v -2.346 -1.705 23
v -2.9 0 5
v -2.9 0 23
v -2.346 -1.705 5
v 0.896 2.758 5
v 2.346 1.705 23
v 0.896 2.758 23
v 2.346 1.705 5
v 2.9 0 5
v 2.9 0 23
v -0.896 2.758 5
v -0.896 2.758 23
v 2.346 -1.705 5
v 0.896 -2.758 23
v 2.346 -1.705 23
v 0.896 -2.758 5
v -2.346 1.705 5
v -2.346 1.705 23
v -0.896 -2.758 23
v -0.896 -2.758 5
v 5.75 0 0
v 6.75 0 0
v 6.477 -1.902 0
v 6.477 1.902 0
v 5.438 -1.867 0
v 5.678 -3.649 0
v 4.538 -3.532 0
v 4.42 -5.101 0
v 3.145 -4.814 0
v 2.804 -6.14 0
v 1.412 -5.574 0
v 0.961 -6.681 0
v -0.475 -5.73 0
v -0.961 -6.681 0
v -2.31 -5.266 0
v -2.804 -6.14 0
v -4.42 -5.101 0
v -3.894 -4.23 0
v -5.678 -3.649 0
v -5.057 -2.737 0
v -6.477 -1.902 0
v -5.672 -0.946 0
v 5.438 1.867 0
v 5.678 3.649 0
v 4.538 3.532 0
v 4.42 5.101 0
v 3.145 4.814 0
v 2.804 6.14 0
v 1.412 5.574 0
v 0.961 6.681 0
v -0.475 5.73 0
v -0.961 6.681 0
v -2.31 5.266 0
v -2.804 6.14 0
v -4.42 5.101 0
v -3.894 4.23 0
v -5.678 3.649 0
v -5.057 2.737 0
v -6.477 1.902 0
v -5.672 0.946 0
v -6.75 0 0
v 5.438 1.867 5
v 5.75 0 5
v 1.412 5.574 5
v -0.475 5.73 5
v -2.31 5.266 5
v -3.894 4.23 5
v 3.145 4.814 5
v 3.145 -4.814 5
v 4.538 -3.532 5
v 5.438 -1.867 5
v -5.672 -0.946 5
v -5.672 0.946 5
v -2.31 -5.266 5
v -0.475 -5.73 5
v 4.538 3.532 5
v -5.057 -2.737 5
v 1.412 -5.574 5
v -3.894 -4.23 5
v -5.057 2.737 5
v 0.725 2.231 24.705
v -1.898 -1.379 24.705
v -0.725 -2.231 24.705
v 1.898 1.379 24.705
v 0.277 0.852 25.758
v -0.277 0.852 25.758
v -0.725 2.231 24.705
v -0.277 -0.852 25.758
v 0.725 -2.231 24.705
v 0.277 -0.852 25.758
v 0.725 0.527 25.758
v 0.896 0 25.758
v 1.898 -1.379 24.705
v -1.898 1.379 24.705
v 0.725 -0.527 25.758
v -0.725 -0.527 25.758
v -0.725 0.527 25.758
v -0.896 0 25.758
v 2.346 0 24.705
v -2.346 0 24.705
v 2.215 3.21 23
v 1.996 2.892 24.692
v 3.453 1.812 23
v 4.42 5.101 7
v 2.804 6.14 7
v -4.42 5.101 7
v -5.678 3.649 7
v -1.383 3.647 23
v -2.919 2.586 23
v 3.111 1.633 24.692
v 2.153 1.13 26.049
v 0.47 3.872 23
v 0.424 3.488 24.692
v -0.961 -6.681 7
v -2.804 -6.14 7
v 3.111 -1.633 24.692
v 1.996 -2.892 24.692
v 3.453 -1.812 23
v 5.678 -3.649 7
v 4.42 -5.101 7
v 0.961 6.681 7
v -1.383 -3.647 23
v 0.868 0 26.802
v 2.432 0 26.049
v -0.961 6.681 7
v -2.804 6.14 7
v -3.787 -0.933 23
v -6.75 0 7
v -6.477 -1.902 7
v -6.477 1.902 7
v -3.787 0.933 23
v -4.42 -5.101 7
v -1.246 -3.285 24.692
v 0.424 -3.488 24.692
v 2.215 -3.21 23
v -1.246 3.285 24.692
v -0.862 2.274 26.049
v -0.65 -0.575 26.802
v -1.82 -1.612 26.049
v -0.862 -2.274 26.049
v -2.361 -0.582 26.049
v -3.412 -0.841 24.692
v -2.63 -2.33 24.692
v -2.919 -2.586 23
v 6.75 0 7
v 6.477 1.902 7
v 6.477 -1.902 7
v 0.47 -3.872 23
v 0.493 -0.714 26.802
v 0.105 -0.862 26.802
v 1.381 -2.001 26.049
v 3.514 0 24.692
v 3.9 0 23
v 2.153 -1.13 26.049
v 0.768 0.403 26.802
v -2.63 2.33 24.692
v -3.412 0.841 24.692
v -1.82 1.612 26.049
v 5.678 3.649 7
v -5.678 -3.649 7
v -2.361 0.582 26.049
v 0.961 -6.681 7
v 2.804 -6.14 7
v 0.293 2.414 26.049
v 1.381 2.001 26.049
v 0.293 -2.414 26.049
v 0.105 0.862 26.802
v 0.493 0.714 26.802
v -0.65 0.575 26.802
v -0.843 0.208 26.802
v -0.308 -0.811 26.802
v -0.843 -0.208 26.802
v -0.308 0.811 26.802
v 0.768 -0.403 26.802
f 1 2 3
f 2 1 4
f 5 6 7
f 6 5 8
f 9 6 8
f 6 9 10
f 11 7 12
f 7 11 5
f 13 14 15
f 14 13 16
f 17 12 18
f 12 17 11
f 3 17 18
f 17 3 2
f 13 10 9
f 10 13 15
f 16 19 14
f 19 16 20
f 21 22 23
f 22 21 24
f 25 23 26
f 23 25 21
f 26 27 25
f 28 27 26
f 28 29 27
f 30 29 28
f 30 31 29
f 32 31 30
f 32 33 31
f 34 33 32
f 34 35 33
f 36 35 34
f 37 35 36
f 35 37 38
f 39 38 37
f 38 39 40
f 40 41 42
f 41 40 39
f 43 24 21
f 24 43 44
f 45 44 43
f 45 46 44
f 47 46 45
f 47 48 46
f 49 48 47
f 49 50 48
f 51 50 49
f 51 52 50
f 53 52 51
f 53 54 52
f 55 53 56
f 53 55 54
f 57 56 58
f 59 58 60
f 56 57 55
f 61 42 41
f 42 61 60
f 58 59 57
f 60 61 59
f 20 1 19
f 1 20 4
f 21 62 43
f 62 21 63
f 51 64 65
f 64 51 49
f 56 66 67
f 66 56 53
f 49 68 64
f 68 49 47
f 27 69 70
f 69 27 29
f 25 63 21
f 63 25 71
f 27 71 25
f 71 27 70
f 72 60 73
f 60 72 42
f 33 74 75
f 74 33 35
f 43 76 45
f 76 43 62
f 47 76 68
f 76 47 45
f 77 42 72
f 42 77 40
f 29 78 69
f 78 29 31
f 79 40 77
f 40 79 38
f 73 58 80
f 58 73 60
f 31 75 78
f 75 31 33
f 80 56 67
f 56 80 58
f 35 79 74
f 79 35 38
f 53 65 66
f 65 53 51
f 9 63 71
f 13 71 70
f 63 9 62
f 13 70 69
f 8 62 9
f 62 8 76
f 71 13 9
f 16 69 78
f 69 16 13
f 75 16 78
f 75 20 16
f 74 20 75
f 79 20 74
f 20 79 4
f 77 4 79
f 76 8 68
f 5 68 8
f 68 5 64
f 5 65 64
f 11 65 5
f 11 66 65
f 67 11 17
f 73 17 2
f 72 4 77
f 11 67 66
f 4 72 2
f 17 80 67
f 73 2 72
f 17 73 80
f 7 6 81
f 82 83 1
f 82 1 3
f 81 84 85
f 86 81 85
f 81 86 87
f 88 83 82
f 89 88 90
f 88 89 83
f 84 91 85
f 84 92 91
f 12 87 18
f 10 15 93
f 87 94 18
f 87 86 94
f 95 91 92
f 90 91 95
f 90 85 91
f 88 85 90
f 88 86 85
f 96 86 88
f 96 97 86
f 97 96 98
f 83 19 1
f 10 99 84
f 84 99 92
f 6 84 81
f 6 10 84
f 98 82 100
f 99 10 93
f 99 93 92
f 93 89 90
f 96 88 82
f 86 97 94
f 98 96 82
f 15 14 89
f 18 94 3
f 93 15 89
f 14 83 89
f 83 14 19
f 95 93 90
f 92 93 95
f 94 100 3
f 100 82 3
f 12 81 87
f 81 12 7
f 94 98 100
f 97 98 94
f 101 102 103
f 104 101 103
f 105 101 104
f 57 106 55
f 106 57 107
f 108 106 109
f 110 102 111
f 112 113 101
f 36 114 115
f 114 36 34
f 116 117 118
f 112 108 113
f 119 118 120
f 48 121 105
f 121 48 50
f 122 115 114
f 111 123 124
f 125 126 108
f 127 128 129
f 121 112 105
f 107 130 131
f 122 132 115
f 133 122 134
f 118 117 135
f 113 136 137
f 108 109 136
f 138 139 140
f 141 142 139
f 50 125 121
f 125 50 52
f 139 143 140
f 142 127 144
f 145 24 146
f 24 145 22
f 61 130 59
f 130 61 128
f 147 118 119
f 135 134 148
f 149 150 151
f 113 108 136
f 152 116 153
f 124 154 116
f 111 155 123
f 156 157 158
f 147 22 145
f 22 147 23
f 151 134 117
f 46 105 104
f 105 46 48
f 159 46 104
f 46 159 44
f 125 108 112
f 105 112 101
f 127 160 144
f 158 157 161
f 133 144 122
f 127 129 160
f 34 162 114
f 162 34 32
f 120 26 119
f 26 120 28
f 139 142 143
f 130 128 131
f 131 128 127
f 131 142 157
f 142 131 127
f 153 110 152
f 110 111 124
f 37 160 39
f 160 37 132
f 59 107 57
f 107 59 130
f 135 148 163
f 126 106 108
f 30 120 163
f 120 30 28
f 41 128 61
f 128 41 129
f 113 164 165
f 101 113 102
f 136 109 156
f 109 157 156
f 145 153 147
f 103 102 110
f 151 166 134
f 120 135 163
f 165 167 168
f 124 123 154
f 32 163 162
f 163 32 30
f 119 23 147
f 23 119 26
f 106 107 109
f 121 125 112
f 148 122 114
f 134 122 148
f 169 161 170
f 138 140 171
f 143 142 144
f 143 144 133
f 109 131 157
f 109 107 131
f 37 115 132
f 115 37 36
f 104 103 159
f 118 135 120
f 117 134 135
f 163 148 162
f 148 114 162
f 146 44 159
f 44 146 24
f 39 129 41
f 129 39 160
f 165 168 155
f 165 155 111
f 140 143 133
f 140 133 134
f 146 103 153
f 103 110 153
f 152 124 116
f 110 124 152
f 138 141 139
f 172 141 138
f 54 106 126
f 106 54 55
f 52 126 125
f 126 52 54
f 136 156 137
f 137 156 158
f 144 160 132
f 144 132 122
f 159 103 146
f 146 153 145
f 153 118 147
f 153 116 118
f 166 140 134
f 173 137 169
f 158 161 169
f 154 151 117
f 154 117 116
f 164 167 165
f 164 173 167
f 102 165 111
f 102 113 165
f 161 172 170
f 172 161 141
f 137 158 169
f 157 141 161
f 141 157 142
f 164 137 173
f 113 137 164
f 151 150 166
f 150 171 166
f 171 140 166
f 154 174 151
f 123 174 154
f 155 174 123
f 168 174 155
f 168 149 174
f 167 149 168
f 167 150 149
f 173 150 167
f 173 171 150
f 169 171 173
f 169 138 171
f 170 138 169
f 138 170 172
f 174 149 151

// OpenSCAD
plug_h = 23;

cut_off=1.5;
hole_d = 5.8;
hole_depth = plug_h;
hole_taper_d = 5.1;
hole_taper_h = 3;
nut_hole_h = 5;
nut_hole_d = 11.5;

wall = 2;

outer_d = hole_d+wall;
outer_nut_d = nut_hole_d+wall;
outer_nut_h = nut_hole_h+wall;


module cut_out() {
    translate([0, 0, 0]) {
  cylinder(h=hole_depth, d=hole_d);
  cylinder(h=nut_hole_h, d=nut_hole_d);
  translate([0, 0, nut_hole_h]) cylinder(h=hole_taper_h, d1=hole_taper_d, d2=hole_d);
  translate([0, 0, plug_h]) sphere(d=outer_d-2);
    }
}

module outer_shell() {
    translate([0, 0, 0]) {
  cylinder(h=plug_h, d=outer_d);
  cylinder(h=outer_nut_h, d=outer_nut_d);
  translate([0, 0, plug_h]) sphere(d=outer_d);
    }
}

module screw_cover() 
difference() {
sphere(d=sphere_d);
translate([0, 0, 0]) {
  cylinder(h=hole_depth, d=hole_d);
  cylinder(h=nut_hole_h, d=nut_hole_d);
  translate([0, 0, nut_hole_h]) cylinder(h=hole_taper_h, d1=hole_taper_d, d2=hole_d);

}
translate([0, 0, 0.5*sphere_d-cut_off]) cylinder(d=sphere_d, h=sphere_d);
}

difference() {

hull() 
   outer_shell();
cut_out();
}
